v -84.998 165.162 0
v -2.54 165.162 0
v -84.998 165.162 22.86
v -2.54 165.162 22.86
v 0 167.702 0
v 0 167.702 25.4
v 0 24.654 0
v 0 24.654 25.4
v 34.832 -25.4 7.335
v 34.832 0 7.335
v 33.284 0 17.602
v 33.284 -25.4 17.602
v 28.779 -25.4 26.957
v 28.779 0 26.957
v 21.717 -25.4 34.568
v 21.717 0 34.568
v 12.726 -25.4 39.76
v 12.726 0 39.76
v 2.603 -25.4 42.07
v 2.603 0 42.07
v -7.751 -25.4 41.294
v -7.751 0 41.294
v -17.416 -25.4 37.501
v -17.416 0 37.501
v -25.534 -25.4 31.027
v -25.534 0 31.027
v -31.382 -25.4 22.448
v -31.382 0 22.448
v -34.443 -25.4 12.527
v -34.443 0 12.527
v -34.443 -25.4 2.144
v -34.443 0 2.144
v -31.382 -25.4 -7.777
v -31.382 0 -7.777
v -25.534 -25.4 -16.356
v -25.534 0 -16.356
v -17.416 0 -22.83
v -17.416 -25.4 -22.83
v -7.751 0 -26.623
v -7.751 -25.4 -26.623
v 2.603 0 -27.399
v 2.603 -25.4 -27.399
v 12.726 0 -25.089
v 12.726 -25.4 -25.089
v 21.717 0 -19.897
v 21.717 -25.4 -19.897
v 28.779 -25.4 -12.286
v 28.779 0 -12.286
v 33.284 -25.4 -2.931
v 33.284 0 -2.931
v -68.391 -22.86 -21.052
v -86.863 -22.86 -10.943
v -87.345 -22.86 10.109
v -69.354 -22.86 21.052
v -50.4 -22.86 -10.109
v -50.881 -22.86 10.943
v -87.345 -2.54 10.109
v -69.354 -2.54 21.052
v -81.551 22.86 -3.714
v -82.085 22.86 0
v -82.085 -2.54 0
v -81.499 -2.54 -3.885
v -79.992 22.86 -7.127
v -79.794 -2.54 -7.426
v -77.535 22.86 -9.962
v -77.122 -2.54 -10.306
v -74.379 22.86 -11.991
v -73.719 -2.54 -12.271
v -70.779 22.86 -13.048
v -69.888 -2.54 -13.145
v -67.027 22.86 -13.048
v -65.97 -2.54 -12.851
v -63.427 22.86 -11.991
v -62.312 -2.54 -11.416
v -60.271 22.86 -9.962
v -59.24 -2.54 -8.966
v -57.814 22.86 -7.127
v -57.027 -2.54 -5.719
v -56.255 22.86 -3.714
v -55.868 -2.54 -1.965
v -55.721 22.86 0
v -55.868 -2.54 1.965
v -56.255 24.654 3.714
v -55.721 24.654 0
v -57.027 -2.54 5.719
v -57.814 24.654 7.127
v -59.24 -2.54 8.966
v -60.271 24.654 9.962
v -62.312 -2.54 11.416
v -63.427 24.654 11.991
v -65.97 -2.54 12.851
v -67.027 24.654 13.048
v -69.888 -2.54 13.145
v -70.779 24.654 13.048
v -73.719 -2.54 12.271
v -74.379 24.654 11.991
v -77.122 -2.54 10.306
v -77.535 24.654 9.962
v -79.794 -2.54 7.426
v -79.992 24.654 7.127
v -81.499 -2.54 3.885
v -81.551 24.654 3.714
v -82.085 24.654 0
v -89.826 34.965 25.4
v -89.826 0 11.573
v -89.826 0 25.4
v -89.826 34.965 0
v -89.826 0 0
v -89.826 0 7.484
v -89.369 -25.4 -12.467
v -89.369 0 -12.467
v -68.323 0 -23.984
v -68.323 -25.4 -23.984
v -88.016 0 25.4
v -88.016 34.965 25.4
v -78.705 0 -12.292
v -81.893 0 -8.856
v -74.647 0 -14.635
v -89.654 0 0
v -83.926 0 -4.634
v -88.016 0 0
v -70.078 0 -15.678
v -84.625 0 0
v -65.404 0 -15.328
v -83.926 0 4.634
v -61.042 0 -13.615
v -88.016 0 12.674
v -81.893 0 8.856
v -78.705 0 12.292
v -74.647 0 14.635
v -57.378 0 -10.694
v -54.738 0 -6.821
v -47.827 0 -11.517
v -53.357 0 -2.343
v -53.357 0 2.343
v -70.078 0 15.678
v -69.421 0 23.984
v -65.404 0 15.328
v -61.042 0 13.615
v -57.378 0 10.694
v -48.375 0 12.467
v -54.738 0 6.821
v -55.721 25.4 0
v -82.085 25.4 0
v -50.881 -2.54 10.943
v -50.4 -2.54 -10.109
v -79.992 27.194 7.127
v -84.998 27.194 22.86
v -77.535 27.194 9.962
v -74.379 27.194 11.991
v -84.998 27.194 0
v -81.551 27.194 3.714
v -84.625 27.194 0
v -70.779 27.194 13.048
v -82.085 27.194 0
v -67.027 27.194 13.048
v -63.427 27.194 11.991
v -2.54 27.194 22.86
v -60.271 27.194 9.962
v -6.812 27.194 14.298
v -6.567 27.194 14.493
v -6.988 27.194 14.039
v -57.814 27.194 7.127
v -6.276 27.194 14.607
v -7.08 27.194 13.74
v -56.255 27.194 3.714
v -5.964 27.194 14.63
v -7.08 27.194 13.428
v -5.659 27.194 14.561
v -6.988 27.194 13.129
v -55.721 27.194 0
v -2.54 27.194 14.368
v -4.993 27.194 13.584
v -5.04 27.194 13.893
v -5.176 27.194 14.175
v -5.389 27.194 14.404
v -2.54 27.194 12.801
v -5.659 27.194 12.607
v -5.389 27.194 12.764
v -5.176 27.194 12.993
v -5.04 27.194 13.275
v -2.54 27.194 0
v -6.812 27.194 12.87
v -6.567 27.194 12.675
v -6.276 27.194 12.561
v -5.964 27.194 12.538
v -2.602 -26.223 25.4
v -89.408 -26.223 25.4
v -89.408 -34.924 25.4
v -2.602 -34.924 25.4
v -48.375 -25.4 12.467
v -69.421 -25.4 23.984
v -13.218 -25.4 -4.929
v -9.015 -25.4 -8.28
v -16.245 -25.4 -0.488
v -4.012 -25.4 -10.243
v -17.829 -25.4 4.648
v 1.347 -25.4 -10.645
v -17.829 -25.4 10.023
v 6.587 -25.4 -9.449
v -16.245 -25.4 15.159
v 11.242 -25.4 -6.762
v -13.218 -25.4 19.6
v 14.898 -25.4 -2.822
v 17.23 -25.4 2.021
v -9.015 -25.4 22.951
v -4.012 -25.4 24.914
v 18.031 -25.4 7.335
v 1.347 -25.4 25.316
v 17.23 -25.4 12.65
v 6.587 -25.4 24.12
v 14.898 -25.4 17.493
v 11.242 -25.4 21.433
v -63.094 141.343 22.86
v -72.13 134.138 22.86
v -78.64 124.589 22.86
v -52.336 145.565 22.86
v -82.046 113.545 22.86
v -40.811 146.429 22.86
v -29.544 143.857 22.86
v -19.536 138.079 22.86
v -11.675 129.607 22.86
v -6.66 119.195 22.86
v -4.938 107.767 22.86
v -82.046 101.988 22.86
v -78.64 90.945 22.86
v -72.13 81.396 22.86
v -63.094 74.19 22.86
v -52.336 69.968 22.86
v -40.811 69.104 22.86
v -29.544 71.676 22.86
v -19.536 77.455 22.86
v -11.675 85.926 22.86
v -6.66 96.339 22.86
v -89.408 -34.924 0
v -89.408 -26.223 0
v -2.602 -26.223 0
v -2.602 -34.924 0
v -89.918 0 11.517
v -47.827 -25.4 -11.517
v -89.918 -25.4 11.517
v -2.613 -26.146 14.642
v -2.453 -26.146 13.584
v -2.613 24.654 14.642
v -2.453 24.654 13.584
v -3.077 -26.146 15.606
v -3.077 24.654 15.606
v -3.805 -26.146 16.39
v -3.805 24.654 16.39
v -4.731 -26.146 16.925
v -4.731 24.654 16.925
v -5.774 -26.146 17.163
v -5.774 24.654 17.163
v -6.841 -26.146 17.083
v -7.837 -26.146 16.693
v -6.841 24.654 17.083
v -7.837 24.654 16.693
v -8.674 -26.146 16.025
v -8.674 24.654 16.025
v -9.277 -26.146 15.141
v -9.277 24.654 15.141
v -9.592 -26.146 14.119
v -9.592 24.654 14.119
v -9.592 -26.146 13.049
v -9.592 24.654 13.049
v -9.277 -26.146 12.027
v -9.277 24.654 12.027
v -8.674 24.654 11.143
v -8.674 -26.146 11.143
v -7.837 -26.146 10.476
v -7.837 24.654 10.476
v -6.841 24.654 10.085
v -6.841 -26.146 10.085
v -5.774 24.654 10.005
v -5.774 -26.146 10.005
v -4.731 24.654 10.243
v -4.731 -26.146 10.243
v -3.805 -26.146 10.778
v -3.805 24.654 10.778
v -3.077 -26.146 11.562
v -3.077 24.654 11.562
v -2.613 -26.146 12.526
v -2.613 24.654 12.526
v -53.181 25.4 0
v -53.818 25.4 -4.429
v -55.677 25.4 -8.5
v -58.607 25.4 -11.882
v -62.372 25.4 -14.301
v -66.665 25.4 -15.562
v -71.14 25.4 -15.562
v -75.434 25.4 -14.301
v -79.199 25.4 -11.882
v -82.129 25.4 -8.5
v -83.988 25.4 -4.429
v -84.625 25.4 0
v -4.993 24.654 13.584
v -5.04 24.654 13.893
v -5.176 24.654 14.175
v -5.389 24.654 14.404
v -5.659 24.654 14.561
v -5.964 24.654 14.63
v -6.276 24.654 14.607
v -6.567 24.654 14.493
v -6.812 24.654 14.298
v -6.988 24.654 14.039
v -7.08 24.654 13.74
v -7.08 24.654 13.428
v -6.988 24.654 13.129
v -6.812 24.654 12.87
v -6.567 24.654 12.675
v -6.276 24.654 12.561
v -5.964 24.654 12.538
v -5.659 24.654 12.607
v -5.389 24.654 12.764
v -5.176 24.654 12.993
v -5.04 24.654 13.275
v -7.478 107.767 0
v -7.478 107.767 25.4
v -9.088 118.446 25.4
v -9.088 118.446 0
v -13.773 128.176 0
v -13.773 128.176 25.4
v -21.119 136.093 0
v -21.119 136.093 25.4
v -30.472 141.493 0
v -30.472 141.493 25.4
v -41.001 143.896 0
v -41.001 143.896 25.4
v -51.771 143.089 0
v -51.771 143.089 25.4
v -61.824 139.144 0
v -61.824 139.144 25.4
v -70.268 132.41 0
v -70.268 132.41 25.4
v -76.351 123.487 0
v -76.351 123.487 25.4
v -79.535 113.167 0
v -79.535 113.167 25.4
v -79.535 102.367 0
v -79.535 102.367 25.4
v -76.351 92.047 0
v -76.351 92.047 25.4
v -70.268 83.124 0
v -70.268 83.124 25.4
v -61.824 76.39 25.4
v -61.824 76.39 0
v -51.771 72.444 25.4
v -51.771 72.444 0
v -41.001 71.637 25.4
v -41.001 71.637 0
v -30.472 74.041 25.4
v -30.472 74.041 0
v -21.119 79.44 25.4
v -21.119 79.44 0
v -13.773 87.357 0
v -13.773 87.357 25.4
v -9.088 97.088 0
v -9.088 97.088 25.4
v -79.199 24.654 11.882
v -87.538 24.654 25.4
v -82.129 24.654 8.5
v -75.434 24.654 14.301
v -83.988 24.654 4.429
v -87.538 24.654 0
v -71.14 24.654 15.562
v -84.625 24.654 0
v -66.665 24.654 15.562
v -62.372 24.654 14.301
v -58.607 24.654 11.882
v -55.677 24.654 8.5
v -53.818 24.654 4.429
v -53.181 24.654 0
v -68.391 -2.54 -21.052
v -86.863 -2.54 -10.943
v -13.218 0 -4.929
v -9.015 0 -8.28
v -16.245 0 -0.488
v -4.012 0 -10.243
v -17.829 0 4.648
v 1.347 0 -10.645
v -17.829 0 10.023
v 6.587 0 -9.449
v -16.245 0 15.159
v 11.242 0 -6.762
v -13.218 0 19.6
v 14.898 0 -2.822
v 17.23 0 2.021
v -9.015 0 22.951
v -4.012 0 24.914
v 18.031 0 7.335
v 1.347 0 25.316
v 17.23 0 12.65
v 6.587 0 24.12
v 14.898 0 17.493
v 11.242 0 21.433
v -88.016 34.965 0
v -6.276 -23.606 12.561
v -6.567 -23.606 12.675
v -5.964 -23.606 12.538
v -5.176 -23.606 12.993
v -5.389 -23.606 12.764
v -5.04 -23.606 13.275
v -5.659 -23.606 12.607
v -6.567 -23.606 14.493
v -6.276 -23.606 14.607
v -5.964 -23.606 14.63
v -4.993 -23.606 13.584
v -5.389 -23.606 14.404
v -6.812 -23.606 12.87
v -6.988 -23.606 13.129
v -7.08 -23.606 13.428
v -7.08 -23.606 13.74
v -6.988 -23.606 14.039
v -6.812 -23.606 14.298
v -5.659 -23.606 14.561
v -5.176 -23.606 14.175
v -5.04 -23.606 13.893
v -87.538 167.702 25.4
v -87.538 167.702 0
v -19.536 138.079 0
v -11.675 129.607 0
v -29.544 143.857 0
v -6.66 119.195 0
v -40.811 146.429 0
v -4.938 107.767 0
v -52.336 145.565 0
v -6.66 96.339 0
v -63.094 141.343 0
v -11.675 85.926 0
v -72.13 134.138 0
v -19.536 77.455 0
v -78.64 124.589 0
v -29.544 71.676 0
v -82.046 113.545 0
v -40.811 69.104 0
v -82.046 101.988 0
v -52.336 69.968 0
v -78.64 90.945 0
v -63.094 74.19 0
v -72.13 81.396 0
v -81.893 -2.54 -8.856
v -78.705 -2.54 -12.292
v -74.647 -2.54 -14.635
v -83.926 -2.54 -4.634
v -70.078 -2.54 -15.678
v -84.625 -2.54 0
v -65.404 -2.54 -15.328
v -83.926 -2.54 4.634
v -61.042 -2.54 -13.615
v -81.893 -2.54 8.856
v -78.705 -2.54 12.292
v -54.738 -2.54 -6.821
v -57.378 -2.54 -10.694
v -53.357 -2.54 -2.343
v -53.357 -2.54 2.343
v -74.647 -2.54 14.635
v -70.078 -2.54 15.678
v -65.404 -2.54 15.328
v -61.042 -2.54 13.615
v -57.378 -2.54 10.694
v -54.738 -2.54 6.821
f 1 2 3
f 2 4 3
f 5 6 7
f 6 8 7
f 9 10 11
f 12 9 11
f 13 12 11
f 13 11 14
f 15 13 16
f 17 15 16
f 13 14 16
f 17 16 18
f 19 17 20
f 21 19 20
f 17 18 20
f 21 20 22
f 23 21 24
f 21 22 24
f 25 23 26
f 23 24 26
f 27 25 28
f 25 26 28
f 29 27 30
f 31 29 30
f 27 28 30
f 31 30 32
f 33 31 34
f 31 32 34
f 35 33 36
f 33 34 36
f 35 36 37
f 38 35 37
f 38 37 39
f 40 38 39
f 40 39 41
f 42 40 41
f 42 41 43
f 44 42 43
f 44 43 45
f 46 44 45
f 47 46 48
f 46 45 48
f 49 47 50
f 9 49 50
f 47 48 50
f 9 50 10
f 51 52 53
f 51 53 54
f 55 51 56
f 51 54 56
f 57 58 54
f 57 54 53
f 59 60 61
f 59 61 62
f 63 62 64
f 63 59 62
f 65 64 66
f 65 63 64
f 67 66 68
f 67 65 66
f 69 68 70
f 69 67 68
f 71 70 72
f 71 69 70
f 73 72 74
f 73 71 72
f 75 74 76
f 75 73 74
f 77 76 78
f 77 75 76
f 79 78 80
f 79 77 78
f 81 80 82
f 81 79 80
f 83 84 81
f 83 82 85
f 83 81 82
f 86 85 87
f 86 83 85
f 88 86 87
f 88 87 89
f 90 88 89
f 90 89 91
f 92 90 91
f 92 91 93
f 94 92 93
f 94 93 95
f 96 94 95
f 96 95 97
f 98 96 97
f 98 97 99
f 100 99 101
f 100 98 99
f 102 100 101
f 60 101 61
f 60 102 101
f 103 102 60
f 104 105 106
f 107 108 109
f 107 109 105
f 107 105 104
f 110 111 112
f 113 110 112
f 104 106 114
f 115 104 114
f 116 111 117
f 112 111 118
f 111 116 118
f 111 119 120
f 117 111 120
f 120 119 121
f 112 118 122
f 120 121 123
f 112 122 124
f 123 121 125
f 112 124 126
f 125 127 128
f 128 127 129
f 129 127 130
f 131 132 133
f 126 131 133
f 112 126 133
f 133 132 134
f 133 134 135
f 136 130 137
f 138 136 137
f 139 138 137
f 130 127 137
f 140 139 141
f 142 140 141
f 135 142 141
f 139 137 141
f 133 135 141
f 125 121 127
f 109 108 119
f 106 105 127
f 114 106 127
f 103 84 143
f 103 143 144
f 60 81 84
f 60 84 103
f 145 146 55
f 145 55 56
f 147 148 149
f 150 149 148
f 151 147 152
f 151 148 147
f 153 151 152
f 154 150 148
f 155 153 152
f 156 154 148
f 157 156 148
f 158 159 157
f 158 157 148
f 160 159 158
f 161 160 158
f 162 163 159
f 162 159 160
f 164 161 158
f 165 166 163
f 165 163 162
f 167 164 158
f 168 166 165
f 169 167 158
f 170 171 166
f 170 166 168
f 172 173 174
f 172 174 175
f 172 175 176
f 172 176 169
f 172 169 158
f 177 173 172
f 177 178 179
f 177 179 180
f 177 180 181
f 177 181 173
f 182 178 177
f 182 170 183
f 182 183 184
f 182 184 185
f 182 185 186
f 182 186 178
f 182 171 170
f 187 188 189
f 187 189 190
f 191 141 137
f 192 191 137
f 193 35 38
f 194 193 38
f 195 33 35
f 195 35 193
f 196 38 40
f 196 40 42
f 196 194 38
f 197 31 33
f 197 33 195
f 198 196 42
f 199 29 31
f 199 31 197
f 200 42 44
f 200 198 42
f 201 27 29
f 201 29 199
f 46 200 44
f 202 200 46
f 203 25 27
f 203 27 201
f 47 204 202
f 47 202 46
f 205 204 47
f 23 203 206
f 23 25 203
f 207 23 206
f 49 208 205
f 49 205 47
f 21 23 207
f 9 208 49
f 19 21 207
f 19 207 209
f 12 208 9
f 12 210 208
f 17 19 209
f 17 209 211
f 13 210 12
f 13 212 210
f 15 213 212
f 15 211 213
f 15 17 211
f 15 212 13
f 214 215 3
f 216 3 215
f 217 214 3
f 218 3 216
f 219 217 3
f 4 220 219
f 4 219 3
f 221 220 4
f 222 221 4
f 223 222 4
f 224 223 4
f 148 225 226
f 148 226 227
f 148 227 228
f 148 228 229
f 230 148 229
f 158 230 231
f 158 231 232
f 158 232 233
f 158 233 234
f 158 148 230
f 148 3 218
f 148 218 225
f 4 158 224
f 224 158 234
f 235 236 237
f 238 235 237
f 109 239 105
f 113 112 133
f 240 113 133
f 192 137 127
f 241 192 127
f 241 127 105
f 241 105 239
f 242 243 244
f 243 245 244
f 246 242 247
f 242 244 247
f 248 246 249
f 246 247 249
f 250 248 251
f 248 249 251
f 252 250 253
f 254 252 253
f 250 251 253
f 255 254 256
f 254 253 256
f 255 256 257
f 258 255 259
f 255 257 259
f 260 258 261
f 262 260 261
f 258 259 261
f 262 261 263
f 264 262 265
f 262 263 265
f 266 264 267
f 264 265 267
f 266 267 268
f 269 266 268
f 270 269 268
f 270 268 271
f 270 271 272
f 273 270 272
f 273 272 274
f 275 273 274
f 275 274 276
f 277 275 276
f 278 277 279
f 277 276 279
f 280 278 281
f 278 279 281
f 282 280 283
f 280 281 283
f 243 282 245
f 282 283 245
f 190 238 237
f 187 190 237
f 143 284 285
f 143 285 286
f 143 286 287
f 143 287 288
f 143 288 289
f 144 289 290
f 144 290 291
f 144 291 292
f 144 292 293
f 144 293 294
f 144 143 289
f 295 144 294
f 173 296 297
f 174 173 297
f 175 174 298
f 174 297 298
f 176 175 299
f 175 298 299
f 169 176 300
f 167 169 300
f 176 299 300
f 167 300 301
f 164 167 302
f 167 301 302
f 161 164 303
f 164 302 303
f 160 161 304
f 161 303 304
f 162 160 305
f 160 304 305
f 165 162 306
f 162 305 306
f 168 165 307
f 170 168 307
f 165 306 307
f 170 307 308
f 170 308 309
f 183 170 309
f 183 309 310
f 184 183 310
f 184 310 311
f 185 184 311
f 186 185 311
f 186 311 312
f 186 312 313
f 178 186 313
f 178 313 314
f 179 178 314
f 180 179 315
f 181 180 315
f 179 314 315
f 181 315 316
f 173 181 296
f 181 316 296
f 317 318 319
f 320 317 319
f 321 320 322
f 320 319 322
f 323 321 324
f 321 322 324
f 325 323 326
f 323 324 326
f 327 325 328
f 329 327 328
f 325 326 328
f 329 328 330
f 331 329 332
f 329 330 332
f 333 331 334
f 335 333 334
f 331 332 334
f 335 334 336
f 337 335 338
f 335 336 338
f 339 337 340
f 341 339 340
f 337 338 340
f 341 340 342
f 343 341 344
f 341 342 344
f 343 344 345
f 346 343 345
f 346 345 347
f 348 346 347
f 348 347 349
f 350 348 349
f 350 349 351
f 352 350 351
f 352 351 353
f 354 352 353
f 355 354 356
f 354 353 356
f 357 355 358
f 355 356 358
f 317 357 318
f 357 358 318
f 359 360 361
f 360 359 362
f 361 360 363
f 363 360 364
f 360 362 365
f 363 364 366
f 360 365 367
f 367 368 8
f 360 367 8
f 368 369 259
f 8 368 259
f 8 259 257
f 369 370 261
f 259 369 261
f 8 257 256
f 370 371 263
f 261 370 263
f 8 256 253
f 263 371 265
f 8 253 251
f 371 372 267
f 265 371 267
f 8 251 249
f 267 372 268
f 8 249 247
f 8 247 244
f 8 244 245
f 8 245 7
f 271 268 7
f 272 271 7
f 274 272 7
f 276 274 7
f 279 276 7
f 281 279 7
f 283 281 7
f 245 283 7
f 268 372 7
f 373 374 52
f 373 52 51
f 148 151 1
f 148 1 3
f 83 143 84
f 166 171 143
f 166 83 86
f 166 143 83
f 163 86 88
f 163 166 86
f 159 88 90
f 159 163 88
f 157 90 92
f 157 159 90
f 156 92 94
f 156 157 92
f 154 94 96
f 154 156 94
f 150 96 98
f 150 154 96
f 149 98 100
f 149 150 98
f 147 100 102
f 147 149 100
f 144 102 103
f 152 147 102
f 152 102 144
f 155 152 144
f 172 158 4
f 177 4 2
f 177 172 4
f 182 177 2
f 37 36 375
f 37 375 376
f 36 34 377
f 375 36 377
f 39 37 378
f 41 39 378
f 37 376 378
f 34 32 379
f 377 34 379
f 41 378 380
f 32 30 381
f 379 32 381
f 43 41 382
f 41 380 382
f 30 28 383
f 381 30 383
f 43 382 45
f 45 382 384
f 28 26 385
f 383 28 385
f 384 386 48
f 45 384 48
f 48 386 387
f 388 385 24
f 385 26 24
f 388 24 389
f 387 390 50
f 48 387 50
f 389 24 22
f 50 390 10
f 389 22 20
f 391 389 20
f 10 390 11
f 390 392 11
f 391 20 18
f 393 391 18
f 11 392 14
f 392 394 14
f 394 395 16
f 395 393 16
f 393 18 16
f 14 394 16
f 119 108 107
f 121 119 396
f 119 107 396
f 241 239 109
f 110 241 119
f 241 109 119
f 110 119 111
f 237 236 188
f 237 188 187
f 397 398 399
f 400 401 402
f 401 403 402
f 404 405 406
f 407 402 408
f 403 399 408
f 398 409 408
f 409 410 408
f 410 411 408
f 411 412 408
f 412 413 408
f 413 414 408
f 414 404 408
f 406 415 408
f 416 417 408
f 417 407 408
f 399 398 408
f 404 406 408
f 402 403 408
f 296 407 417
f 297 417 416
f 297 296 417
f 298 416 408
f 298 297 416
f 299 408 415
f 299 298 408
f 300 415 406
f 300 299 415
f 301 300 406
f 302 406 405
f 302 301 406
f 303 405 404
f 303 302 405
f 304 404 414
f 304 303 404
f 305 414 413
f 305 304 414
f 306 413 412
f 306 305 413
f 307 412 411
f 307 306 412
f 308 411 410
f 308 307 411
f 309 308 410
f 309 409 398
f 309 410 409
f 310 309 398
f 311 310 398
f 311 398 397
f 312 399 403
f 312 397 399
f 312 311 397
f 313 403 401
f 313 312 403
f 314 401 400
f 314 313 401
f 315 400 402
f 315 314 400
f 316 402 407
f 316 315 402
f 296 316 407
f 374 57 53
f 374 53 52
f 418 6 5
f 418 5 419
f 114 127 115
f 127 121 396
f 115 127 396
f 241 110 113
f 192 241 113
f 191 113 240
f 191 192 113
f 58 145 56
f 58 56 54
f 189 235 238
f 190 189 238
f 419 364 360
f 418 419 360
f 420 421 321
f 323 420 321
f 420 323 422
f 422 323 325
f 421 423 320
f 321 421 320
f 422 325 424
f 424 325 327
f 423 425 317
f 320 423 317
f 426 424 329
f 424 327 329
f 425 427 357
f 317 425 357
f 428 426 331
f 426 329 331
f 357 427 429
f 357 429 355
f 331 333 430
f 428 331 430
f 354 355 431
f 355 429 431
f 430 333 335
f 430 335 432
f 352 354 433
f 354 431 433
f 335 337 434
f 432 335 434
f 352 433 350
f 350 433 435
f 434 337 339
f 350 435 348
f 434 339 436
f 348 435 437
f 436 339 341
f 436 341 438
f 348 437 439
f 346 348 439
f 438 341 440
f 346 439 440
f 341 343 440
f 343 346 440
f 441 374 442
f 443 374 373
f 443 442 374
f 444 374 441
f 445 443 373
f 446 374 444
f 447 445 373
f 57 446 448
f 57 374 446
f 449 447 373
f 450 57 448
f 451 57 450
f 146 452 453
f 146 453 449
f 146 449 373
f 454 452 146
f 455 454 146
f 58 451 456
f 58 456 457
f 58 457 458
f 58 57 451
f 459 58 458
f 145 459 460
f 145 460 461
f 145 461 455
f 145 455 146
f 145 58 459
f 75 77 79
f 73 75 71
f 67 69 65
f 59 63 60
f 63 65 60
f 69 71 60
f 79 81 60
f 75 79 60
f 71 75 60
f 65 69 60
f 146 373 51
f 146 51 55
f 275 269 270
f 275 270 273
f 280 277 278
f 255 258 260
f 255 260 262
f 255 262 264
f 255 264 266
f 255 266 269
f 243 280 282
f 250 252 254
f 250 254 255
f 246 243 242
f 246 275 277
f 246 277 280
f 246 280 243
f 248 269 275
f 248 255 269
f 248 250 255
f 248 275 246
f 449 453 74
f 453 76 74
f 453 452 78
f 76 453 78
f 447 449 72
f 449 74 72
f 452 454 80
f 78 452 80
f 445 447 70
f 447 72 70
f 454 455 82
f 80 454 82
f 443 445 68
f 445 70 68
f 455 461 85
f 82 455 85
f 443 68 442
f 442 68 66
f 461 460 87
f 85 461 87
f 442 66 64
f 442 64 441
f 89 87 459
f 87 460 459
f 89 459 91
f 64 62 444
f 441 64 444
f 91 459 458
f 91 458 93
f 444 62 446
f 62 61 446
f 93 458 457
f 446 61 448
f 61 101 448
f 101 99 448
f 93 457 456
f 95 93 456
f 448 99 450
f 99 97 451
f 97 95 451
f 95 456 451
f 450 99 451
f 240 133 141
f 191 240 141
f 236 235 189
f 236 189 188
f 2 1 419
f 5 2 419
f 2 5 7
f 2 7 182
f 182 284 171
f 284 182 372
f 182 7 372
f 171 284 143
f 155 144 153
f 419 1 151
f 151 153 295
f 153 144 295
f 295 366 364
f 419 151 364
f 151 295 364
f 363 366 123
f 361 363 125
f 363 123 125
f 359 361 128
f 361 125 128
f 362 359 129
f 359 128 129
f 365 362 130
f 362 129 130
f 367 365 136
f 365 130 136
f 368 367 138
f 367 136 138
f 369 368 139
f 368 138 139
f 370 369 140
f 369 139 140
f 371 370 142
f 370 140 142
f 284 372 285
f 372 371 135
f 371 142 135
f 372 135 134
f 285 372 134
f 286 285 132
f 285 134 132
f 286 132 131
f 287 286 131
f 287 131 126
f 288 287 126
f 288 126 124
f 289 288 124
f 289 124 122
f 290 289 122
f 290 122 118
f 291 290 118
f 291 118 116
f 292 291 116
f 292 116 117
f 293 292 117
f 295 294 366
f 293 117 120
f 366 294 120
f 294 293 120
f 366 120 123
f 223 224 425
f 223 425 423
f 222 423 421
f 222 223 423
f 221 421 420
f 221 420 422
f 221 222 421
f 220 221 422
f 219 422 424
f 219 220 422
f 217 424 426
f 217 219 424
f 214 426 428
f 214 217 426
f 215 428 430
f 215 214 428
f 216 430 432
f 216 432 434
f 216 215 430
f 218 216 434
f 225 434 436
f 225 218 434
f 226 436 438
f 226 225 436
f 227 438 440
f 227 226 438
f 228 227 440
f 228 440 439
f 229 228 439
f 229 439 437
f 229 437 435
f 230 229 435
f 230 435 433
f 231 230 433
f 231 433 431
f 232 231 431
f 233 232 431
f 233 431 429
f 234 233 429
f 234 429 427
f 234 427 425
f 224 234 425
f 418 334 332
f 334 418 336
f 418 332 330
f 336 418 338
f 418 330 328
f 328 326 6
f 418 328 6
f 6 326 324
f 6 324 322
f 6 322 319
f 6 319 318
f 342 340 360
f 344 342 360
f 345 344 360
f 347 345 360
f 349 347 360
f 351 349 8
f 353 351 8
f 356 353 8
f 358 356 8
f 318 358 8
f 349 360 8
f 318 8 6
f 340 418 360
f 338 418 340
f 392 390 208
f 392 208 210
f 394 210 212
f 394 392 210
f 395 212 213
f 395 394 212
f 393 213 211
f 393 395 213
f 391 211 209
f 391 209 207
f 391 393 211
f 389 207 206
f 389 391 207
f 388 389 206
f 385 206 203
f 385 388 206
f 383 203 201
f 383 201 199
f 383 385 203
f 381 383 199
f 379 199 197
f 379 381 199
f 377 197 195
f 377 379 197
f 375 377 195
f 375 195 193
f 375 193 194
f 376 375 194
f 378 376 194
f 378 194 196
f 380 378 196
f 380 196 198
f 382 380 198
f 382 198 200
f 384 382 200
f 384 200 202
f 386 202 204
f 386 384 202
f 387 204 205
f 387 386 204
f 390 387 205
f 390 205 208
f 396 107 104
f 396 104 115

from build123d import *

# Parameters (mm, degrees)
F1_DEPTH     = 25.4
F2_R         = 25.8999671589
F2_R_2       = 17.2023355416
F3_DEPTH     = 25.4
F4_R         = 34.8318560705
F4_R_2       = 18.0308272553
F5_DEPTH     = 25.4
F6_R         = 14.9551436637
F7_DEPTH     = 25.4
F8_R         = 15.7218012702
F9_DEPTH     = 25.4
F10_W        = 87.5383242965
F10_H        = 13.5084241629
F11_DEPTH    = 25.4
F12_R        = 3.589274675
F13_DEPTH    = 25.4
F15_DEPTH    = 129.54
F16_DEPTH    = 25.4
F17_W        = 86.8061985821
F17_H        = 8.7011847645
F18_DEPTH    = 25.4
F19_R        = 36.2307294495
F20_DEPTH    = 25.4
F21_T        = 2.54
F21_T6_ANGLE = 180.000000001
F22_W        = 1.8093809485
F22_H        = 34.9651761353
F23_DEPTH    = 25.4


# Not quite as in the source:
# - a shell that OpenCascade refuses in one call is made with other operations: the cavity is built on its own and cut out


with BuildPart() as f1:
    # F0 (on Front) → F1 (new body)
    with BuildSketch(Plane.XZ):
        Polygon((-48.3754668356, 12.4674958523), (-69.4210231304, 23.9844769239), (-89.9177994608, 11.5169810717), (-89.3690194964, -12.4674958523), (-68.3234632015, -23.9844769239), (-47.8266868711, -11.5169810717), align=None)
    extrude(amount=F1_DEPTH)

    # F2 (on Front) → F3 (cut)
    with BuildSketch(Plane.XZ):
        Circle(F2_R)
        Circle(F2_R_2, mode=Mode.SUBTRACT)
        Circle(F2_R_2)
    extrude(amount=-F3_DEPTH, mode=Mode.SUBTRACT)

    # F6 (on Front) → F7 (join)
    with BuildSketch(Plane.XZ):
        with Locations((-68.4596300125, 0)):
            Circle(F6_R)
    extrude(amount=F7_DEPTH)

    # F8 (on face) → F9 (join)
    with BuildSketch(Plane(origin=(0, 0, 0), x_dir=(-1, 0, 0), z_dir=(0, 1, 0))):
        with Locations((68.9029097557, 0)):
            Circle(F8_R)
    extrude(amount=F9_DEPTH)

    # F10 (on Top) → F11 (join)
    with BuildSketch(Plane.XY):
        with Locations((-43.7691621482, 31.4080566168)):
            Rectangle(F10_W, F10_H)
    extrude(amount=F11_DEPTH)

    # F12 (on face) → F13 (join)
    with BuildSketch(Plane.XZ.offset(-24.6538445354)):
        with Locations((-6.0427188873, 13.5841108859)):
            Circle(F12_R)
    extrude(amount=F13_DEPTH)

    # F14 (on face) → F15 (join)
    with BuildSketch(Plane(origin=(0, 38.1622686982, 0), x_dir=(-1, 0, 0), z_dir=(0, 1, 0))):
        Polygon((49.9359071255, 0), (87.5383242965, 0), (87.5383242965, 25.4), (0, 25.4), (0, 0), align=None)
    extrude(amount=F15_DEPTH)

    # F16 (add): a face of the model
    f16_faces = [f1.faces().sort_by_distance(p)[0] for p in [
        (-6.0427188873, -0.7461554646, 13.5841108859),
    ]]
    extrude(f16_faces, amount=F16_DEPTH)

    # F19 (on face) → F20 (cut)
    with BuildSketch(Plane.XY.offset(25.4)):
        with Locations((-43.7086820602, 107.7667698264)):
            Circle(F19_R)
    extrude(amount=-F20_DEPTH, mode=Mode.SUBTRACT)

    # F21: shell of thickness 2.54, made by hand


with BuildPart() as f5:
    # F4 (on Front) → F5 (new body)
    with BuildSketch(Plane.XZ):
        with Locations((0, 7.3354803026)):
            Circle(F4_R)
        with Locations((0, 7.3354803026)):
            Circle(F4_R_2, mode=Mode.SUBTRACT)
    extrude(amount=F5_DEPTH)


with BuildPart() as f18:
    # F17 (on Top) → F18 (new body)
    with BuildSketch(Plane.XY):
        with Locations((-46.0046427324, -30.5737545714)):
            Rectangle(F17_W, F17_H)
    extrude(amount=F18_DEPTH)


with BuildPart() as f21_core1:
    # F21_t2: copy of F1
    add(f1.part)

    # the walls: a layer under each face that stays
    f21_faces = [f21_core1.faces().sort_by_distance(p)[0] for p in [
        (-58.898244983, -12.7, 18.2259863881),
        (-48.1010768534, -12.7, 0.4752573903),
        (-79.6694112956, -12.7, 17.7507289978),
        (-82.9026140292, 0, -15.9896512826),
        (-68.872243166, -25.4, 0),
        (-58.0750750363, -12.7, -17.7507289978),
        (-89.6434094786, -12.7, -0.4752573903),
        (-78.8462413489, -12.7, -18.2259863881),
        (-53.1811084855, 12.7, 0),
        (-68.9029097557, 25.4, -7.8609006351),
        (-43.7691621482, 24.6538445354, 12.7),
        (0, 96.1780566168, 12.7),
        (-43.7691621482, 167.7022686982, 12.7),
        (-87.5383242965, 96.1780566168, 12.7),
        (-79.9394115097, 107.7667698264, 12.7),
        (-72.9486035804, 48.4952485625, 25.4),
        (-9.6319935623, -0.7461554646, 13.5841108859),
        (-6.0427188873, -26.1461554646, 13.5841108859),
    ]]
    thicken(f21_faces, amount=-F21_T, mode=Mode.SUBTRACT)

    # F21_s3 → F21_t4 (revolve, cut)
    with BuildSketch(Plane.XY):
        Polygon((-84.6501110259, 0.0254), (-84.6247110259, -2.54), (-82.0847110259, -2.54), (-82.0847110259, 0), align=None)
    revolve(axis=Axis((-68.9029097557, 0, 0), (0, 1, 0)), mode=Mode.SUBTRACT)

    # F21_s5 → F21_t6 (revolve, cut)
    with BuildSketch(Plane.XY):
        Polygon((-53.1557084855, 24.6284445354), (-55.7211084855, 24.6538445354), (-55.7211084855, 27.1938445354), (-53.1811084855, 27.1938445354), align=None)
    revolve(axis=Axis((-68.9029097557, 24.6538445354, 0), (0, -1, 0)), revolution_arc=F21_T6_ANGLE, mode=Mode.SUBTRACT)

    # F21_s7 → F21_t8 (revolve, cut)
    with BuildSketch(Plane.XY.offset(13.5841108859)):
        Polygon((-2.4280442124, 24.6284445354), (-2.4534442124, 27.1938445354), (-4.9934442124, 27.1938445354), (-4.9934442124, 24.6538445354), align=None)
    revolve(axis=Axis((-6.0427188873, 24.6538445354, 13.5841108859), (0, -1, 0)), mode=Mode.SUBTRACT)


with BuildPart() as f1_1:
    add(f1.part)

    # what is left inside the walls is the cavity
    f21_cavity = [f21_core1.part.solids().sort_by_distance(p)[0] for p in [
        (-64.383743, 38.671363, 0.0254),
    ]]
    add(f21_cavity, mode=Mode.SUBTRACT)

    # F22 (on Top) → F23 (join)
    with BuildSketch(Plane.XY):
        with Locations((-88.920827955, 17.4825880677)):
            Rectangle(F22_W, F22_H)
    extrude(amount=F23_DEPTH)


solid = Compound([f5.part, f18.part, f1_1.part])
